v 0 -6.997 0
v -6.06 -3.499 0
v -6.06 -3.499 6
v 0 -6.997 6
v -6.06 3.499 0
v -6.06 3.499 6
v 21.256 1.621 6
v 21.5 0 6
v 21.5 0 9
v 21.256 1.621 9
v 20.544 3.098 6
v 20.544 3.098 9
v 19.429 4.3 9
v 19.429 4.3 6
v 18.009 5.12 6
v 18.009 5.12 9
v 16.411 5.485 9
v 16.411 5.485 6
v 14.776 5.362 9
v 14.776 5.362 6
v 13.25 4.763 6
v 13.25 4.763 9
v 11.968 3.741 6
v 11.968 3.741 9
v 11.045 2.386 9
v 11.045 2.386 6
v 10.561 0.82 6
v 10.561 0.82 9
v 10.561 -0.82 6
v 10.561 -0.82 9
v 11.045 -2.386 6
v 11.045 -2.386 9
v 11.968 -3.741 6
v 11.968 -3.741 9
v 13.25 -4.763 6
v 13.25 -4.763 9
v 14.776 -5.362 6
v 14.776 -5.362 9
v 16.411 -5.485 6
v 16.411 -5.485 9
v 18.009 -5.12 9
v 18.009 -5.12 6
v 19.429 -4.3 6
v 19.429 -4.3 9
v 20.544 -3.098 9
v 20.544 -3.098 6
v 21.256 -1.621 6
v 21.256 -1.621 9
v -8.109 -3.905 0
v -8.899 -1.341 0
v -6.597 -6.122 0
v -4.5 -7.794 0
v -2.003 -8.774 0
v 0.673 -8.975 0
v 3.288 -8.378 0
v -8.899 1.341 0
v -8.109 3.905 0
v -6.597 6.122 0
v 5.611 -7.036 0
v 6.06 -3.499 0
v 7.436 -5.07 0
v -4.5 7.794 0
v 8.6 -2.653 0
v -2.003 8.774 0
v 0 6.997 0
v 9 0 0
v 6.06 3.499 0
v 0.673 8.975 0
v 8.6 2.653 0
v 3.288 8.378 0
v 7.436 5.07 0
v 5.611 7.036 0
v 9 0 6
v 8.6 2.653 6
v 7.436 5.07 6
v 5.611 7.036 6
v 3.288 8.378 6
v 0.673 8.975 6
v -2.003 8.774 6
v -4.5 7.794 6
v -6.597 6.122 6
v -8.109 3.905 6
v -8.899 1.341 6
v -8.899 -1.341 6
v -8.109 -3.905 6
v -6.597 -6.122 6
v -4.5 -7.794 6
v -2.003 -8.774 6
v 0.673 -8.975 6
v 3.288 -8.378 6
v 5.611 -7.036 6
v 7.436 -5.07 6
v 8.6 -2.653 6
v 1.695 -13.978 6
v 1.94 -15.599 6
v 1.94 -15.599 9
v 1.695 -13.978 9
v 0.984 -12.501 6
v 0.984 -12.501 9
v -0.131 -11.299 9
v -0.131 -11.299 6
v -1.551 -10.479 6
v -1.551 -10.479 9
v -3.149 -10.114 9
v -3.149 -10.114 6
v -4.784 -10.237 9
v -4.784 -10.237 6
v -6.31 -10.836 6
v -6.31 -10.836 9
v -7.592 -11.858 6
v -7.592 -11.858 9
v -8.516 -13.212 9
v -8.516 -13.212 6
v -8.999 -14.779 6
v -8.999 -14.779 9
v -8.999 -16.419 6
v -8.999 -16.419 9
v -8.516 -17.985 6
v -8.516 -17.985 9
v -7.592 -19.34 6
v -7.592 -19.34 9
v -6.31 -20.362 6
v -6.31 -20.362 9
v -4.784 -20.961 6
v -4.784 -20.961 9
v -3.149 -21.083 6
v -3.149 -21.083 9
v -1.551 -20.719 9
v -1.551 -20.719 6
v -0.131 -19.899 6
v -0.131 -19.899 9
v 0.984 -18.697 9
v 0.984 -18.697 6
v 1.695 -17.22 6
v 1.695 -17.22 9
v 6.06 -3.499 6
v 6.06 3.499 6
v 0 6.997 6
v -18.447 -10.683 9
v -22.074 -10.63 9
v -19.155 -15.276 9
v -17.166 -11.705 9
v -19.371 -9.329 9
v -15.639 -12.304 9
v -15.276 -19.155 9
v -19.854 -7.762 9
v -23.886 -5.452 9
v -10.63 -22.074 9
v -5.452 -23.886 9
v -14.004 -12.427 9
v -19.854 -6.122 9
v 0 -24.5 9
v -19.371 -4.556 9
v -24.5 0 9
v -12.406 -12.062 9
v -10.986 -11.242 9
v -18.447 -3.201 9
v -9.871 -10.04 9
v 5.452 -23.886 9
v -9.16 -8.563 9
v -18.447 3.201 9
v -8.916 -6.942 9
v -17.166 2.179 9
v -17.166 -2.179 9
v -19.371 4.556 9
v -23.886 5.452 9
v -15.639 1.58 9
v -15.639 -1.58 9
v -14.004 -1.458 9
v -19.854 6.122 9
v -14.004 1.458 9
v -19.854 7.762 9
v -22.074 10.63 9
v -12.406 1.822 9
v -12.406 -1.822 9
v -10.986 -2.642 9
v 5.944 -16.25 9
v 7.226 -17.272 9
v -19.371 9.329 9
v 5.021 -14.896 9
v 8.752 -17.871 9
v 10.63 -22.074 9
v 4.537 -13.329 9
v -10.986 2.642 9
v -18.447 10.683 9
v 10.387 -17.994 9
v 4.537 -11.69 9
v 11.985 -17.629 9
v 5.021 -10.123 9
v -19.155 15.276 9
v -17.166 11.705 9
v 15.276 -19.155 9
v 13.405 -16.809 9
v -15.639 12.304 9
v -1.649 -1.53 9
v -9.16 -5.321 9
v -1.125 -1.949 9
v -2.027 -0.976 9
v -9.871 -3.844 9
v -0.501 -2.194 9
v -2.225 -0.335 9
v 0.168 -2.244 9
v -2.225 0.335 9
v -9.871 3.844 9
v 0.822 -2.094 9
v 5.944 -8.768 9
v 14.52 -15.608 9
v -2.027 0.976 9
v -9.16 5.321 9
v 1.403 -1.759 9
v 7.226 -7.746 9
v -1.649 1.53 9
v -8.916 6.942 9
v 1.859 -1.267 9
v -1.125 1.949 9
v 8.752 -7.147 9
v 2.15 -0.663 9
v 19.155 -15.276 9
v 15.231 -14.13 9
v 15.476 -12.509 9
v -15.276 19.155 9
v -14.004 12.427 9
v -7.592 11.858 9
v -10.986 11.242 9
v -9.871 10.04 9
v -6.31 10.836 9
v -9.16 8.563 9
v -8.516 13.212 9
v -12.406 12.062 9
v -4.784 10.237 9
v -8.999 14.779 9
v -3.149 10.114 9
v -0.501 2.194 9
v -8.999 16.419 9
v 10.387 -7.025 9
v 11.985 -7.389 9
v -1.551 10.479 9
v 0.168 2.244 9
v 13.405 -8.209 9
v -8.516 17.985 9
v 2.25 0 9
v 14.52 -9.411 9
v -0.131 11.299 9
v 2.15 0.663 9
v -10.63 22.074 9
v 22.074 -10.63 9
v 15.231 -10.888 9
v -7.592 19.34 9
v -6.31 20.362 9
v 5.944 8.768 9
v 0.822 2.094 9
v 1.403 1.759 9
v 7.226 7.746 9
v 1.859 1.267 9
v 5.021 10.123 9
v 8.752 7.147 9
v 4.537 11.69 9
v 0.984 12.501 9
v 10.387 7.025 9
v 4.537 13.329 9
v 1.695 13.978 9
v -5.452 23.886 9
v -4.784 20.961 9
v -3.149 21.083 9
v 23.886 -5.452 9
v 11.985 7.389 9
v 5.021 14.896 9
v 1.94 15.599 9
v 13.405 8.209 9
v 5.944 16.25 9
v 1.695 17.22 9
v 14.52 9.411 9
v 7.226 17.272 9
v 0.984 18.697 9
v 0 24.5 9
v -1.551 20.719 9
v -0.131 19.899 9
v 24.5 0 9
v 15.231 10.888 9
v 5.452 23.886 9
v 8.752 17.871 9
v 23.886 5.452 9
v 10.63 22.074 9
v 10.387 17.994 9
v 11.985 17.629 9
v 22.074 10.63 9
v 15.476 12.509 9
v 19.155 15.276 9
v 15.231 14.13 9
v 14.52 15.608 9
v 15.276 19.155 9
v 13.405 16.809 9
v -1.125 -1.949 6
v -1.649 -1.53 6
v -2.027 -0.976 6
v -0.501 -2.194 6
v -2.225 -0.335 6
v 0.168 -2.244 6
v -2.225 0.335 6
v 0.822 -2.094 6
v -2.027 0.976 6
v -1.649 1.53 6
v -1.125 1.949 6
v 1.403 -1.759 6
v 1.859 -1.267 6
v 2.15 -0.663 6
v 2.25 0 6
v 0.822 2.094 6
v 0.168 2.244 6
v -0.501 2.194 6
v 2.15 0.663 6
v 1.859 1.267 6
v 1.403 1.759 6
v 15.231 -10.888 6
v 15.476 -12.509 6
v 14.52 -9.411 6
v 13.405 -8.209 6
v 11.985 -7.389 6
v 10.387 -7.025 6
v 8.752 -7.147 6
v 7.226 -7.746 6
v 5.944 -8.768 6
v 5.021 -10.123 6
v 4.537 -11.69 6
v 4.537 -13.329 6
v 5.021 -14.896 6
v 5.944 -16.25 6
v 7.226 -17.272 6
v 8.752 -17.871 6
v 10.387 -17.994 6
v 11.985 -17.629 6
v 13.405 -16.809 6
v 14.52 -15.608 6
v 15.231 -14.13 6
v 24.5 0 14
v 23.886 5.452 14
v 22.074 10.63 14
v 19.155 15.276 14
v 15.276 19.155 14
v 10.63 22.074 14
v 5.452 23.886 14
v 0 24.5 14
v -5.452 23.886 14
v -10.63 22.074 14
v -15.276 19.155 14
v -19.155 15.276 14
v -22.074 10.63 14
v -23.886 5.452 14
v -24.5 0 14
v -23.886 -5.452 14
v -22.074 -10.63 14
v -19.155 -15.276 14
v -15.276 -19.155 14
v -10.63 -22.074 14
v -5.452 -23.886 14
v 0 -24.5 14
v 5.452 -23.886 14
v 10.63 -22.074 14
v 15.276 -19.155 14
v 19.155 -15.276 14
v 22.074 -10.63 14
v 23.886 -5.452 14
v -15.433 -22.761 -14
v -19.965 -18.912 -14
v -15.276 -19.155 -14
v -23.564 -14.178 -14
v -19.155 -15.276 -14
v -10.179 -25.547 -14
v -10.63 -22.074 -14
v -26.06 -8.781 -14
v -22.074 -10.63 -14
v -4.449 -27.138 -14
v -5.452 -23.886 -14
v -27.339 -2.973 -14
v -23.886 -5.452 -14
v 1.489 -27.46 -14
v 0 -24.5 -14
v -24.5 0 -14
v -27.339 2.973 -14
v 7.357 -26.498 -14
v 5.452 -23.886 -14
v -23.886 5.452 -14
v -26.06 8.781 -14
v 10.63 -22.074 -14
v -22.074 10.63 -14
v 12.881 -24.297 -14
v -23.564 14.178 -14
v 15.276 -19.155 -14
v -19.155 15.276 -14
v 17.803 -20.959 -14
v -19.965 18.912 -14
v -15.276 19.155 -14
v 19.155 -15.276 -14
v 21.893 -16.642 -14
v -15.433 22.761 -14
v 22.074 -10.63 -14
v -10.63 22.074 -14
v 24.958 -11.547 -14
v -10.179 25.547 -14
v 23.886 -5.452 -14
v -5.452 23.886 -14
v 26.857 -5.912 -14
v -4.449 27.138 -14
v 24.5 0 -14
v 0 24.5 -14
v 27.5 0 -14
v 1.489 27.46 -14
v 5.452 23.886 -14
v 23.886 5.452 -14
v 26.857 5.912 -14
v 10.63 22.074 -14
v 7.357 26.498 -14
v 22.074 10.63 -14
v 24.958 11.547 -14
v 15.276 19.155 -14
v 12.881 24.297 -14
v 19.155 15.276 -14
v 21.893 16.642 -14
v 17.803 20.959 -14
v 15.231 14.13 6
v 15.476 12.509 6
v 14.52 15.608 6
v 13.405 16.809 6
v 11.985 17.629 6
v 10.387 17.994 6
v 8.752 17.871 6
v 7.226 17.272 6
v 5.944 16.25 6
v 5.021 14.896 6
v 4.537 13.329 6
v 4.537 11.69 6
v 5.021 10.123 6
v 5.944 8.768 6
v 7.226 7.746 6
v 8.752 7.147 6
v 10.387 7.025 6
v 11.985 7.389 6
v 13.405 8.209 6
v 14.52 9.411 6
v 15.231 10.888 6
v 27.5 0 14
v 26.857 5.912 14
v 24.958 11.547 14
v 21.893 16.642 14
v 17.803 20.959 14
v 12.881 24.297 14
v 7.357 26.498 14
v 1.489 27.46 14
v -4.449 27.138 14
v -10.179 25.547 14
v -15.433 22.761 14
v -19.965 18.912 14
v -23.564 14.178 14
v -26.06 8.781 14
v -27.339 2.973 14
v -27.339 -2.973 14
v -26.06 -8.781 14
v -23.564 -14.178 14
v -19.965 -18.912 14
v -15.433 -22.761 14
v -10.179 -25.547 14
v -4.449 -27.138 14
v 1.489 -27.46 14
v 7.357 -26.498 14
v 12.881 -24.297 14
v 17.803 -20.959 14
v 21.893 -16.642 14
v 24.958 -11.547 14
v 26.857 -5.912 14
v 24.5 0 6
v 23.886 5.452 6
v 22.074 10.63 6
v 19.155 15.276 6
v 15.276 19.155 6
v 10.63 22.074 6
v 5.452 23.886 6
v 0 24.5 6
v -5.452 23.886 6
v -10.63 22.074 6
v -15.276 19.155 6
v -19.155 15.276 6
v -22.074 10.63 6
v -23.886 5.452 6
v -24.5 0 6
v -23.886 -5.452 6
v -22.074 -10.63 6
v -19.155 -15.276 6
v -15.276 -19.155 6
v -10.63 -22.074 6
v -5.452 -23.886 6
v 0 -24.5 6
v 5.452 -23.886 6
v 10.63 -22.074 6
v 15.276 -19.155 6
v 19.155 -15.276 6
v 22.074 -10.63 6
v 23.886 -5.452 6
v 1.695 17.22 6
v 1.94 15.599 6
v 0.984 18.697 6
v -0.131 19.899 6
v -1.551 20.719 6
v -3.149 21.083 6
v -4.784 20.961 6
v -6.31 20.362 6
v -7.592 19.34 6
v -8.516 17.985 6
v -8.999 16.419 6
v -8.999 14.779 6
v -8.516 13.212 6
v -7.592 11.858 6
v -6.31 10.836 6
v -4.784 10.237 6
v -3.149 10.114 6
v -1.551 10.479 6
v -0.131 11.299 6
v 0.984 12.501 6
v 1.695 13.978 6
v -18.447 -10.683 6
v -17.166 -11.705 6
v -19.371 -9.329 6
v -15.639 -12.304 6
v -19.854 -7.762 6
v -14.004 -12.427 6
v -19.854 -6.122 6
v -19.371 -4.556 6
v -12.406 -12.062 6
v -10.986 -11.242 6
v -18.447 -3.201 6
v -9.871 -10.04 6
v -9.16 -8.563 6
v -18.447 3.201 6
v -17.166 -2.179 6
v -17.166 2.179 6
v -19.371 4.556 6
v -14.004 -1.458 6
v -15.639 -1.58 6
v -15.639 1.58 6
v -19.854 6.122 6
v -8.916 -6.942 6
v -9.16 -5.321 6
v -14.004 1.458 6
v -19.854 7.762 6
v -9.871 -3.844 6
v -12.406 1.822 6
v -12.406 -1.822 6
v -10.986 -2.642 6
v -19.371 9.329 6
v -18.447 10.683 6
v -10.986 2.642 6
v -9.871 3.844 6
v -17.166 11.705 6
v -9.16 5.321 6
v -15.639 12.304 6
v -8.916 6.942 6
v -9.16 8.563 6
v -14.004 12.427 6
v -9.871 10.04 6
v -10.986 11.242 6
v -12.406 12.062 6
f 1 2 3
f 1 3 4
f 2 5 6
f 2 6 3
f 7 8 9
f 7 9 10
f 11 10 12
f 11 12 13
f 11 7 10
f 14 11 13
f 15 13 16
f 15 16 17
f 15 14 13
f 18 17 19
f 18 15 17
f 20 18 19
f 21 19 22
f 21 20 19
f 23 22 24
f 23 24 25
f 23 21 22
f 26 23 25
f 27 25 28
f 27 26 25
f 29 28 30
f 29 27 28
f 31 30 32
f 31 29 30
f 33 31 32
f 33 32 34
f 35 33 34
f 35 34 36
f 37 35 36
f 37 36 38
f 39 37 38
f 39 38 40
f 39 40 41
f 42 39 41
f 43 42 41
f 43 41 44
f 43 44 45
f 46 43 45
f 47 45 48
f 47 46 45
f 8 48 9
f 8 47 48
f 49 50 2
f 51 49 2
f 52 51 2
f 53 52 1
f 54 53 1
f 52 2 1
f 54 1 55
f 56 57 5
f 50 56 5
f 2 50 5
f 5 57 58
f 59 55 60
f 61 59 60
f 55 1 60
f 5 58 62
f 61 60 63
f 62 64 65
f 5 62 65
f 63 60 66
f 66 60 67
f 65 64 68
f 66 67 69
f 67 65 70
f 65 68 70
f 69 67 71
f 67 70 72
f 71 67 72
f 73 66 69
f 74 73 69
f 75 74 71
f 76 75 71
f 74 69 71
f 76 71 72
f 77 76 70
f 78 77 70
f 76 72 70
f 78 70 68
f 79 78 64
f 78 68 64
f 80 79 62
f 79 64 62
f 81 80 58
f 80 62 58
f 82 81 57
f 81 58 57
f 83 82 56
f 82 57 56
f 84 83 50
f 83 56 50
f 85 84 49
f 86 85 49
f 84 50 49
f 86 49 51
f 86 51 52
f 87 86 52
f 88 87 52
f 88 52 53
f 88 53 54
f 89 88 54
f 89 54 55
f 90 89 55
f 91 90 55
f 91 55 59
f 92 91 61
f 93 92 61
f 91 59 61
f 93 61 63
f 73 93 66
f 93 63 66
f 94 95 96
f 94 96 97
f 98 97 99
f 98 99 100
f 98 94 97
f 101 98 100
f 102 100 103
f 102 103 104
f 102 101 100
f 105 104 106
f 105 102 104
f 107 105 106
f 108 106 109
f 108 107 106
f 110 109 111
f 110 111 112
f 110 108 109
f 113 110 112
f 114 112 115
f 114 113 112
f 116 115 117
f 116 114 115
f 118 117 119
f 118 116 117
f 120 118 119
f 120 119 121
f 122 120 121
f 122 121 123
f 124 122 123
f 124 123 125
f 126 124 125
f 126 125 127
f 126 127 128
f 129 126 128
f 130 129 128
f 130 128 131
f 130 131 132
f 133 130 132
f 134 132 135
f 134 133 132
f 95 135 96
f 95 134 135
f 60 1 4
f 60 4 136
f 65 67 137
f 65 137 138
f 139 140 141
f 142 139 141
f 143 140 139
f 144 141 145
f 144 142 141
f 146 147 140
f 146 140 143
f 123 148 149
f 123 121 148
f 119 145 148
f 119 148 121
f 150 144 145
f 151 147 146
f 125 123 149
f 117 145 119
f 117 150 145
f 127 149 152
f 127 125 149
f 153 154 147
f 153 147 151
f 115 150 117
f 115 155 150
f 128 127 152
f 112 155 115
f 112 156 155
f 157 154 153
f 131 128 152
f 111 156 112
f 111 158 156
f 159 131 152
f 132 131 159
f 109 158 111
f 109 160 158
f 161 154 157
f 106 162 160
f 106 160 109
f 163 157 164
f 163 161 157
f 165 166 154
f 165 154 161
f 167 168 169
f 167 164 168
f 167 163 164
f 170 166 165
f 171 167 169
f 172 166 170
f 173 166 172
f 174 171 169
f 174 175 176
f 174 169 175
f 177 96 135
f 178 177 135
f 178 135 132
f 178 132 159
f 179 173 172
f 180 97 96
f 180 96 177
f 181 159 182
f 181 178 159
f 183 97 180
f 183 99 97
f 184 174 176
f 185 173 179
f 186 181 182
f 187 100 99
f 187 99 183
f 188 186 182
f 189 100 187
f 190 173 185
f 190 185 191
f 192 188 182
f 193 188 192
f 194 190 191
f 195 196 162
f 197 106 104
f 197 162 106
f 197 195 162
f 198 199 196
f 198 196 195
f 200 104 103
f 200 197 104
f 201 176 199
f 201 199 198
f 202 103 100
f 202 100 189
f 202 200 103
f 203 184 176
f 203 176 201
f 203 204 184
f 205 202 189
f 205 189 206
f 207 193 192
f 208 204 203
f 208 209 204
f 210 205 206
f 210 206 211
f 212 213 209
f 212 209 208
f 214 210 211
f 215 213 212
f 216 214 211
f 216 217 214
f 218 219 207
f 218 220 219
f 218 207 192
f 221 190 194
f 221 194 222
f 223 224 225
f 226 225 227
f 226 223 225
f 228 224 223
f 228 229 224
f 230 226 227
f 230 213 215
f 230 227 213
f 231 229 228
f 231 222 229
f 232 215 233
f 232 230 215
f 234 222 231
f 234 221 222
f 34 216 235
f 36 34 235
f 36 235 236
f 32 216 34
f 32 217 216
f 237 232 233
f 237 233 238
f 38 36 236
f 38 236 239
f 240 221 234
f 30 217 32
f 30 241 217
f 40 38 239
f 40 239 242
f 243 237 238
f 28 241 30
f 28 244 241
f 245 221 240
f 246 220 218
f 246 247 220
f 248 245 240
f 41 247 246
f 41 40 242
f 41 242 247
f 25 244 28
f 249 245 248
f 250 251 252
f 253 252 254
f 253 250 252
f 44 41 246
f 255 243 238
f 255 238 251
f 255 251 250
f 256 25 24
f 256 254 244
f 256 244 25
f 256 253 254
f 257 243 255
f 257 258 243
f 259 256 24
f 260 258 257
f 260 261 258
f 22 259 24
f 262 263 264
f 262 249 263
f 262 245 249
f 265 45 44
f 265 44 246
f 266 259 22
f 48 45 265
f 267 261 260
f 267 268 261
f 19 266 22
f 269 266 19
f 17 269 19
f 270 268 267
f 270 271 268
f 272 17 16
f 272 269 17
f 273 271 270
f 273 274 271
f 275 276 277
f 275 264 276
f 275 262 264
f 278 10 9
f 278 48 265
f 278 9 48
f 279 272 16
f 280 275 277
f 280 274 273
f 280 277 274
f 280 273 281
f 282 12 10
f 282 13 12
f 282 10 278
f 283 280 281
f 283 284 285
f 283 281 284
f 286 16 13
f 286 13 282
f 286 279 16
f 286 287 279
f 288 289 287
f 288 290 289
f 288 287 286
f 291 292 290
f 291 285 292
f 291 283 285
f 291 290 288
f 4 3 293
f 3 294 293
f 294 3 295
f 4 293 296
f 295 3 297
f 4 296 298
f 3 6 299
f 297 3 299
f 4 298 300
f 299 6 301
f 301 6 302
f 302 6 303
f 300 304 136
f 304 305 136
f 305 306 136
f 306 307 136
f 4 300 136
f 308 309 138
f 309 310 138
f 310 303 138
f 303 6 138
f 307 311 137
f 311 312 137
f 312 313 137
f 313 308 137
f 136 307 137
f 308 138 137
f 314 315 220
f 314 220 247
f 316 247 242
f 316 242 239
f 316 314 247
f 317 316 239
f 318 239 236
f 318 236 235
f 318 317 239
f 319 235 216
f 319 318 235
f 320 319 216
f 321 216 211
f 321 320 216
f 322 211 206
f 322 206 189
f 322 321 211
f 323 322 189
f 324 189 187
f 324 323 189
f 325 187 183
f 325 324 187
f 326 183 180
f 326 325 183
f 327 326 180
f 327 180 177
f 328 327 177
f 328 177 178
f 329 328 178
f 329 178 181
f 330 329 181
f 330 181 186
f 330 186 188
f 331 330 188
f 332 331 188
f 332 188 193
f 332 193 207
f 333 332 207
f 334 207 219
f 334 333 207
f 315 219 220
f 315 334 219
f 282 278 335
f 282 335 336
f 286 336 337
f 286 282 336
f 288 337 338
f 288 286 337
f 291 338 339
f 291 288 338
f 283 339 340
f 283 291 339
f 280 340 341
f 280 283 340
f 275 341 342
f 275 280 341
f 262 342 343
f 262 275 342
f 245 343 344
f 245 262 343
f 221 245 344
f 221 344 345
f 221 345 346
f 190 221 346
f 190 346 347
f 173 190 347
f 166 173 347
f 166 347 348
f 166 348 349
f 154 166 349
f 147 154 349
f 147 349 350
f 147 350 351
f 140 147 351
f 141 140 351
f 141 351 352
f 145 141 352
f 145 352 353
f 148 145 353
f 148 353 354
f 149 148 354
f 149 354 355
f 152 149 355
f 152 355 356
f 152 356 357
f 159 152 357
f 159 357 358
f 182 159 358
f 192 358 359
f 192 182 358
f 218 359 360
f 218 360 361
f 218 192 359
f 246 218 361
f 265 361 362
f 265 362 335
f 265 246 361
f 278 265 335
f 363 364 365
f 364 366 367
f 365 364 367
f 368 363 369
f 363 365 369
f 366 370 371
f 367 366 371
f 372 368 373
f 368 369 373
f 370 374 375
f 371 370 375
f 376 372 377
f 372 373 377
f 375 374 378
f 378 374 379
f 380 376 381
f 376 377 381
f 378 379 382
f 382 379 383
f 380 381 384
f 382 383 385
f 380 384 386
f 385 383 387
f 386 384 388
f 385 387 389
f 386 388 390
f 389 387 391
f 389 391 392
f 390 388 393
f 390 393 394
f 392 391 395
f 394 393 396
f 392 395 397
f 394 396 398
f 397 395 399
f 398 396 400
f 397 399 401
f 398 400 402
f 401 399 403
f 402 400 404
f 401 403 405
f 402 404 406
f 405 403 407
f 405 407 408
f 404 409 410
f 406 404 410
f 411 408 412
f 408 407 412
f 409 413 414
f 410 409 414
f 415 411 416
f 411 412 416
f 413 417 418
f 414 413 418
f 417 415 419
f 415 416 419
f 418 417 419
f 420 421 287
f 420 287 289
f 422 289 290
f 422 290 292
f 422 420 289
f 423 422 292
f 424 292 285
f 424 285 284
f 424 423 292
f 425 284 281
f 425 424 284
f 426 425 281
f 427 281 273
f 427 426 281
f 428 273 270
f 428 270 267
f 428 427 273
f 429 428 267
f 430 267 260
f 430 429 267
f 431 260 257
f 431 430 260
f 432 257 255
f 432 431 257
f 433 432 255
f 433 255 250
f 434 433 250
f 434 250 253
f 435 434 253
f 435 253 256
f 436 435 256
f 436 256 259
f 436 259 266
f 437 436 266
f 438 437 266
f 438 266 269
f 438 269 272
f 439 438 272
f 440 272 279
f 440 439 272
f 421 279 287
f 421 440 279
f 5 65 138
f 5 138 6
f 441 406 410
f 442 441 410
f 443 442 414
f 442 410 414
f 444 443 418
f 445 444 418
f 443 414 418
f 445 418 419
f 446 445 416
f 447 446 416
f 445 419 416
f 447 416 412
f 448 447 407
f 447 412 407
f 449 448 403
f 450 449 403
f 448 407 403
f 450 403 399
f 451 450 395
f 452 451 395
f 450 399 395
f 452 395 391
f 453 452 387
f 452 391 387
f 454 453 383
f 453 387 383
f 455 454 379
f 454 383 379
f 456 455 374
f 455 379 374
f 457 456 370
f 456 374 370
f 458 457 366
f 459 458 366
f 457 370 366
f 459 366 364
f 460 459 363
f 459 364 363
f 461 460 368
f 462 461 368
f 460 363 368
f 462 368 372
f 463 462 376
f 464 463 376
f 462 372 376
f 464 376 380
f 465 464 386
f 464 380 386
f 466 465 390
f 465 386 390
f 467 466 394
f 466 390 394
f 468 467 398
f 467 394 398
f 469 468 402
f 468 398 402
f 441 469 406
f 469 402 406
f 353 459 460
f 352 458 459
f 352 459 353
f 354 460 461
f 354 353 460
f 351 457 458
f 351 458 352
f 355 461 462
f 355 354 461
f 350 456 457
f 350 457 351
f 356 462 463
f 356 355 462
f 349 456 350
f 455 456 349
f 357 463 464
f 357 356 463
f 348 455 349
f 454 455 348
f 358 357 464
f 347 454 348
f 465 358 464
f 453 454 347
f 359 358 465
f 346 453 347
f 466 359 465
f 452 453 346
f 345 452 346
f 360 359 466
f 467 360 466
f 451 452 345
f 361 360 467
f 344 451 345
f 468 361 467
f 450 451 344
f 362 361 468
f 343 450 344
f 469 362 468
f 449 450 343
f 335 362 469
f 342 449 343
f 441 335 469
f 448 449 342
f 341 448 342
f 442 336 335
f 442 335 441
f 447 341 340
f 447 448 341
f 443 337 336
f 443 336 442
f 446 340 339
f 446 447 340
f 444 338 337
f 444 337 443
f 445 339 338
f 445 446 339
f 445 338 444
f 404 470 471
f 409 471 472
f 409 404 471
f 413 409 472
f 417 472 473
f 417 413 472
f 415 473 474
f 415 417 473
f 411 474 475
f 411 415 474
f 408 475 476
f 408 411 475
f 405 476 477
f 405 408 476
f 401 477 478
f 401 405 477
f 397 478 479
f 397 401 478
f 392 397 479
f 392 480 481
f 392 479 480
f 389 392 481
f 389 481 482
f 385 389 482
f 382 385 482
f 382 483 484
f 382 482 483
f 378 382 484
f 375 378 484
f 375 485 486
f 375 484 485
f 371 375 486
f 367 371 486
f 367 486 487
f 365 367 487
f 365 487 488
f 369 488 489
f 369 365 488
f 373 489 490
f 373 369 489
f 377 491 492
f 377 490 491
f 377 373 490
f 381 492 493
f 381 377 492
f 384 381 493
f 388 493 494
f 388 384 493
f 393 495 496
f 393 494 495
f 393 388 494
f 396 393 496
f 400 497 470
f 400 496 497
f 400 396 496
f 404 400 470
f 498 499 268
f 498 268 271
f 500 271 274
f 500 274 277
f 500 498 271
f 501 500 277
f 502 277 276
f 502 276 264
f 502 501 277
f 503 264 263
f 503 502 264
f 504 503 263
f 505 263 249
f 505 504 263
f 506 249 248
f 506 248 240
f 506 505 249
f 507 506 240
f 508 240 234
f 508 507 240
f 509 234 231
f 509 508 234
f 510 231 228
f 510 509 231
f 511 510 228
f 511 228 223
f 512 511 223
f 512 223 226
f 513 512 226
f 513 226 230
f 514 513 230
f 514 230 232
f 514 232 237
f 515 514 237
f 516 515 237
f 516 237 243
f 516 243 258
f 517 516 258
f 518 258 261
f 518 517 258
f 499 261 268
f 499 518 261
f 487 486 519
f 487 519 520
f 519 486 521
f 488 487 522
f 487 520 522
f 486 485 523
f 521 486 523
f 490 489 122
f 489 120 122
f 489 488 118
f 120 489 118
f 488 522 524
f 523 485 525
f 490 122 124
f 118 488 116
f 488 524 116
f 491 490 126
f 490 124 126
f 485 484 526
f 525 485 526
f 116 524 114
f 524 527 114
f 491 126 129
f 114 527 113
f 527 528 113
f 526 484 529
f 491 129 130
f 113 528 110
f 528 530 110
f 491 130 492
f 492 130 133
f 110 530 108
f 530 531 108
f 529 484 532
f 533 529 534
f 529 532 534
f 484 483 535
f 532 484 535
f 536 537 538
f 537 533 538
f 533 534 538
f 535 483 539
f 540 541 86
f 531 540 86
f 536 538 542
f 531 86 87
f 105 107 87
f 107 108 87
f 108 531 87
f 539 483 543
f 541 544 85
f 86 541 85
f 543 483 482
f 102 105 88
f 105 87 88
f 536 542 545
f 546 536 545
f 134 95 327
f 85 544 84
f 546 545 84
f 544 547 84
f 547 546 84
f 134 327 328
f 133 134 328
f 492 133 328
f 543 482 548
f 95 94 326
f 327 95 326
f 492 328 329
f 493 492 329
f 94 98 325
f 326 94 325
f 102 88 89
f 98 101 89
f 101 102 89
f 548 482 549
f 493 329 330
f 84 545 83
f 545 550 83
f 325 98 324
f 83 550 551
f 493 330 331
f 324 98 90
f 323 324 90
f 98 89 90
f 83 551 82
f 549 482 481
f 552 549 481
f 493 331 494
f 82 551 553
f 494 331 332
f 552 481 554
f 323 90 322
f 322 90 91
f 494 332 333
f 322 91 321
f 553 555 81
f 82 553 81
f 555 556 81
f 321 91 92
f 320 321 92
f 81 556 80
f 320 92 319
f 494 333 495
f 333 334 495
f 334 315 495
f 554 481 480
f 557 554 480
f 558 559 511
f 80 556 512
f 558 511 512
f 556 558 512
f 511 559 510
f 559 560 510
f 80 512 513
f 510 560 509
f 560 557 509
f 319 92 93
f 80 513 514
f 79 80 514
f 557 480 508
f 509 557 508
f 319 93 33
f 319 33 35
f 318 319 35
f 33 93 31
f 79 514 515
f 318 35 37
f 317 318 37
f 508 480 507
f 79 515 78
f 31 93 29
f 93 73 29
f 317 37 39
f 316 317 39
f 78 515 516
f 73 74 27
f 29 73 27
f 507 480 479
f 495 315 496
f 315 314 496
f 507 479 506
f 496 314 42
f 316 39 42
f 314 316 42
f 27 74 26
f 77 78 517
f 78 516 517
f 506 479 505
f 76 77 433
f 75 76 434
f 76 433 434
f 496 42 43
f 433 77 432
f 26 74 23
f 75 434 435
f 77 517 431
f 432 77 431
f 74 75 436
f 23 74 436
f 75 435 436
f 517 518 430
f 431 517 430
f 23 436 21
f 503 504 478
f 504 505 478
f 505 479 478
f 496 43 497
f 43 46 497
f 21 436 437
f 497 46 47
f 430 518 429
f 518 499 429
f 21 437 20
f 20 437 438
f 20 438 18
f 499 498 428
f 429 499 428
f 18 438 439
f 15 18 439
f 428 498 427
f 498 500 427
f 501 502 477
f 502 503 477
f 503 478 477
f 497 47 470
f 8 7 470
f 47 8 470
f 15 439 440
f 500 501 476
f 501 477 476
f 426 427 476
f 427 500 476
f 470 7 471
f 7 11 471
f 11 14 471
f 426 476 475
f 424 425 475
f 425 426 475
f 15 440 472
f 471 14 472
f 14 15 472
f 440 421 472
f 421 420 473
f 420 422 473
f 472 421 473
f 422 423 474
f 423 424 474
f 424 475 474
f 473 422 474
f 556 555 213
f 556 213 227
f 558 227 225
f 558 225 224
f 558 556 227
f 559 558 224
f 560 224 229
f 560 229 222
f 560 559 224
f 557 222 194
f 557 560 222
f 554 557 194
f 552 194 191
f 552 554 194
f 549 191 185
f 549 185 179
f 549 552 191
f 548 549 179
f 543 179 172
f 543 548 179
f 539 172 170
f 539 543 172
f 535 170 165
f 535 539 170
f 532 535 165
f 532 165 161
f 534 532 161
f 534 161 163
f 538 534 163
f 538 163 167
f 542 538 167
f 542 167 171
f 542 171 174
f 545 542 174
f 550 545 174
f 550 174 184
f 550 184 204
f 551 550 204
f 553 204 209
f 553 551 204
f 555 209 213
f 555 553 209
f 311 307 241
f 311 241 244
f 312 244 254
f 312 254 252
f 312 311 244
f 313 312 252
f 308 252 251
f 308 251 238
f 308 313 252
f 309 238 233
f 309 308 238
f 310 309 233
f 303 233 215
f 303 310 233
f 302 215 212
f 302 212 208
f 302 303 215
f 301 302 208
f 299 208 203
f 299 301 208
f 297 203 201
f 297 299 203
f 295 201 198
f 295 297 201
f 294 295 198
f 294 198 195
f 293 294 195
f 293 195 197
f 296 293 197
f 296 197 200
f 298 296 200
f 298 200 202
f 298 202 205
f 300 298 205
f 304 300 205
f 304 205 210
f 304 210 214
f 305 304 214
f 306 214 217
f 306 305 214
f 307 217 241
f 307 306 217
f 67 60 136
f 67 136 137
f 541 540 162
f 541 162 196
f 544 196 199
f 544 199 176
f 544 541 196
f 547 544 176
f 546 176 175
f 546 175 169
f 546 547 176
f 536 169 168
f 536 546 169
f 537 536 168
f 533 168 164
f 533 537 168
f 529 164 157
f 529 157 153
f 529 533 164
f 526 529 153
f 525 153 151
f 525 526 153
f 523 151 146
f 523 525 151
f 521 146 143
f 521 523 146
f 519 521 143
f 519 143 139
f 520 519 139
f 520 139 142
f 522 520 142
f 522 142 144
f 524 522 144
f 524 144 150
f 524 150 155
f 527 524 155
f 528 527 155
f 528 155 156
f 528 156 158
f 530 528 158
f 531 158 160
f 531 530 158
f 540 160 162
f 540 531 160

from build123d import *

# Parameters (mm, degrees)
RIM_BARREL_START  = -14
PROFILE_1_R       = 27.5
PROFILE_1_R_2     = 24.5
RIM_BARREL_DEPTH  = 28
SPOKE_WEB_START   = 6
PROFILE_2_R       = 25
PROFILE_2_R_2     = 2.25
PROFILE_2_R_3     = 5.5
SPOKE_WEB_DEPTH   = 3
PROFILE_3_R       = 9
AF12_SOCKET_DEPTH = 6


with BuildPart() as part:
    # Profile_1 → Rim_barrel (new body)
    with BuildSketch(Plane.XY.offset(RIM_BARREL_START)):
        Circle(PROFILE_1_R)
        Circle(PROFILE_1_R_2, mode=Mode.SUBTRACT)
    extrude(amount=RIM_BARREL_DEPTH)

    # Profile_2 → Spoke_web (add)
    with BuildSketch(Plane.XY.offset(SPOKE_WEB_START)):
        Circle(PROFILE_2_R)
        Circle(PROFILE_2_R_2, mode=Mode.SUBTRACT)
        with Locations((16, 0)):
            Circle(PROFILE_2_R_3, mode=Mode.SUBTRACT)
        with Locations((9.97583683, 12.509303719)):
            Circle(PROFILE_2_R_3, mode=Mode.SUBTRACT)
        with Locations((-3.560334943, 15.598846595)):
            Circle(PROFILE_2_R_3, mode=Mode.SUBTRACT)
        with Locations((-14.415501886, 6.942139826)):
            Circle(PROFILE_2_R_3, mode=Mode.SUBTRACT)
        with Locations((-14.415501886, -6.942139826)):
            Circle(PROFILE_2_R_3, mode=Mode.SUBTRACT)
        with Locations((-3.560334943, -15.598846595)):
            Circle(PROFILE_2_R_3, mode=Mode.SUBTRACT)
        with Locations((9.97583683, -12.509303719)):
            Circle(PROFILE_2_R_3, mode=Mode.SUBTRACT)
    extrude(amount=SPOKE_WEB_DEPTH)

    # Profile_3 → AF12_socket (add)
    with BuildSketch(Plane.XY):
        Circle(PROFILE_3_R)
        Polygon((6.06, 3.498742631), (0, 6.997485263), (-6.06, 3.498742631), (-6.06, -3.498742631), (0, -6.997485263), (6.06, -3.498742631), align=None, mode=Mode.SUBTRACT)
    extrude(amount=AF12_SOCKET_DEPTH)


solid = part.part
